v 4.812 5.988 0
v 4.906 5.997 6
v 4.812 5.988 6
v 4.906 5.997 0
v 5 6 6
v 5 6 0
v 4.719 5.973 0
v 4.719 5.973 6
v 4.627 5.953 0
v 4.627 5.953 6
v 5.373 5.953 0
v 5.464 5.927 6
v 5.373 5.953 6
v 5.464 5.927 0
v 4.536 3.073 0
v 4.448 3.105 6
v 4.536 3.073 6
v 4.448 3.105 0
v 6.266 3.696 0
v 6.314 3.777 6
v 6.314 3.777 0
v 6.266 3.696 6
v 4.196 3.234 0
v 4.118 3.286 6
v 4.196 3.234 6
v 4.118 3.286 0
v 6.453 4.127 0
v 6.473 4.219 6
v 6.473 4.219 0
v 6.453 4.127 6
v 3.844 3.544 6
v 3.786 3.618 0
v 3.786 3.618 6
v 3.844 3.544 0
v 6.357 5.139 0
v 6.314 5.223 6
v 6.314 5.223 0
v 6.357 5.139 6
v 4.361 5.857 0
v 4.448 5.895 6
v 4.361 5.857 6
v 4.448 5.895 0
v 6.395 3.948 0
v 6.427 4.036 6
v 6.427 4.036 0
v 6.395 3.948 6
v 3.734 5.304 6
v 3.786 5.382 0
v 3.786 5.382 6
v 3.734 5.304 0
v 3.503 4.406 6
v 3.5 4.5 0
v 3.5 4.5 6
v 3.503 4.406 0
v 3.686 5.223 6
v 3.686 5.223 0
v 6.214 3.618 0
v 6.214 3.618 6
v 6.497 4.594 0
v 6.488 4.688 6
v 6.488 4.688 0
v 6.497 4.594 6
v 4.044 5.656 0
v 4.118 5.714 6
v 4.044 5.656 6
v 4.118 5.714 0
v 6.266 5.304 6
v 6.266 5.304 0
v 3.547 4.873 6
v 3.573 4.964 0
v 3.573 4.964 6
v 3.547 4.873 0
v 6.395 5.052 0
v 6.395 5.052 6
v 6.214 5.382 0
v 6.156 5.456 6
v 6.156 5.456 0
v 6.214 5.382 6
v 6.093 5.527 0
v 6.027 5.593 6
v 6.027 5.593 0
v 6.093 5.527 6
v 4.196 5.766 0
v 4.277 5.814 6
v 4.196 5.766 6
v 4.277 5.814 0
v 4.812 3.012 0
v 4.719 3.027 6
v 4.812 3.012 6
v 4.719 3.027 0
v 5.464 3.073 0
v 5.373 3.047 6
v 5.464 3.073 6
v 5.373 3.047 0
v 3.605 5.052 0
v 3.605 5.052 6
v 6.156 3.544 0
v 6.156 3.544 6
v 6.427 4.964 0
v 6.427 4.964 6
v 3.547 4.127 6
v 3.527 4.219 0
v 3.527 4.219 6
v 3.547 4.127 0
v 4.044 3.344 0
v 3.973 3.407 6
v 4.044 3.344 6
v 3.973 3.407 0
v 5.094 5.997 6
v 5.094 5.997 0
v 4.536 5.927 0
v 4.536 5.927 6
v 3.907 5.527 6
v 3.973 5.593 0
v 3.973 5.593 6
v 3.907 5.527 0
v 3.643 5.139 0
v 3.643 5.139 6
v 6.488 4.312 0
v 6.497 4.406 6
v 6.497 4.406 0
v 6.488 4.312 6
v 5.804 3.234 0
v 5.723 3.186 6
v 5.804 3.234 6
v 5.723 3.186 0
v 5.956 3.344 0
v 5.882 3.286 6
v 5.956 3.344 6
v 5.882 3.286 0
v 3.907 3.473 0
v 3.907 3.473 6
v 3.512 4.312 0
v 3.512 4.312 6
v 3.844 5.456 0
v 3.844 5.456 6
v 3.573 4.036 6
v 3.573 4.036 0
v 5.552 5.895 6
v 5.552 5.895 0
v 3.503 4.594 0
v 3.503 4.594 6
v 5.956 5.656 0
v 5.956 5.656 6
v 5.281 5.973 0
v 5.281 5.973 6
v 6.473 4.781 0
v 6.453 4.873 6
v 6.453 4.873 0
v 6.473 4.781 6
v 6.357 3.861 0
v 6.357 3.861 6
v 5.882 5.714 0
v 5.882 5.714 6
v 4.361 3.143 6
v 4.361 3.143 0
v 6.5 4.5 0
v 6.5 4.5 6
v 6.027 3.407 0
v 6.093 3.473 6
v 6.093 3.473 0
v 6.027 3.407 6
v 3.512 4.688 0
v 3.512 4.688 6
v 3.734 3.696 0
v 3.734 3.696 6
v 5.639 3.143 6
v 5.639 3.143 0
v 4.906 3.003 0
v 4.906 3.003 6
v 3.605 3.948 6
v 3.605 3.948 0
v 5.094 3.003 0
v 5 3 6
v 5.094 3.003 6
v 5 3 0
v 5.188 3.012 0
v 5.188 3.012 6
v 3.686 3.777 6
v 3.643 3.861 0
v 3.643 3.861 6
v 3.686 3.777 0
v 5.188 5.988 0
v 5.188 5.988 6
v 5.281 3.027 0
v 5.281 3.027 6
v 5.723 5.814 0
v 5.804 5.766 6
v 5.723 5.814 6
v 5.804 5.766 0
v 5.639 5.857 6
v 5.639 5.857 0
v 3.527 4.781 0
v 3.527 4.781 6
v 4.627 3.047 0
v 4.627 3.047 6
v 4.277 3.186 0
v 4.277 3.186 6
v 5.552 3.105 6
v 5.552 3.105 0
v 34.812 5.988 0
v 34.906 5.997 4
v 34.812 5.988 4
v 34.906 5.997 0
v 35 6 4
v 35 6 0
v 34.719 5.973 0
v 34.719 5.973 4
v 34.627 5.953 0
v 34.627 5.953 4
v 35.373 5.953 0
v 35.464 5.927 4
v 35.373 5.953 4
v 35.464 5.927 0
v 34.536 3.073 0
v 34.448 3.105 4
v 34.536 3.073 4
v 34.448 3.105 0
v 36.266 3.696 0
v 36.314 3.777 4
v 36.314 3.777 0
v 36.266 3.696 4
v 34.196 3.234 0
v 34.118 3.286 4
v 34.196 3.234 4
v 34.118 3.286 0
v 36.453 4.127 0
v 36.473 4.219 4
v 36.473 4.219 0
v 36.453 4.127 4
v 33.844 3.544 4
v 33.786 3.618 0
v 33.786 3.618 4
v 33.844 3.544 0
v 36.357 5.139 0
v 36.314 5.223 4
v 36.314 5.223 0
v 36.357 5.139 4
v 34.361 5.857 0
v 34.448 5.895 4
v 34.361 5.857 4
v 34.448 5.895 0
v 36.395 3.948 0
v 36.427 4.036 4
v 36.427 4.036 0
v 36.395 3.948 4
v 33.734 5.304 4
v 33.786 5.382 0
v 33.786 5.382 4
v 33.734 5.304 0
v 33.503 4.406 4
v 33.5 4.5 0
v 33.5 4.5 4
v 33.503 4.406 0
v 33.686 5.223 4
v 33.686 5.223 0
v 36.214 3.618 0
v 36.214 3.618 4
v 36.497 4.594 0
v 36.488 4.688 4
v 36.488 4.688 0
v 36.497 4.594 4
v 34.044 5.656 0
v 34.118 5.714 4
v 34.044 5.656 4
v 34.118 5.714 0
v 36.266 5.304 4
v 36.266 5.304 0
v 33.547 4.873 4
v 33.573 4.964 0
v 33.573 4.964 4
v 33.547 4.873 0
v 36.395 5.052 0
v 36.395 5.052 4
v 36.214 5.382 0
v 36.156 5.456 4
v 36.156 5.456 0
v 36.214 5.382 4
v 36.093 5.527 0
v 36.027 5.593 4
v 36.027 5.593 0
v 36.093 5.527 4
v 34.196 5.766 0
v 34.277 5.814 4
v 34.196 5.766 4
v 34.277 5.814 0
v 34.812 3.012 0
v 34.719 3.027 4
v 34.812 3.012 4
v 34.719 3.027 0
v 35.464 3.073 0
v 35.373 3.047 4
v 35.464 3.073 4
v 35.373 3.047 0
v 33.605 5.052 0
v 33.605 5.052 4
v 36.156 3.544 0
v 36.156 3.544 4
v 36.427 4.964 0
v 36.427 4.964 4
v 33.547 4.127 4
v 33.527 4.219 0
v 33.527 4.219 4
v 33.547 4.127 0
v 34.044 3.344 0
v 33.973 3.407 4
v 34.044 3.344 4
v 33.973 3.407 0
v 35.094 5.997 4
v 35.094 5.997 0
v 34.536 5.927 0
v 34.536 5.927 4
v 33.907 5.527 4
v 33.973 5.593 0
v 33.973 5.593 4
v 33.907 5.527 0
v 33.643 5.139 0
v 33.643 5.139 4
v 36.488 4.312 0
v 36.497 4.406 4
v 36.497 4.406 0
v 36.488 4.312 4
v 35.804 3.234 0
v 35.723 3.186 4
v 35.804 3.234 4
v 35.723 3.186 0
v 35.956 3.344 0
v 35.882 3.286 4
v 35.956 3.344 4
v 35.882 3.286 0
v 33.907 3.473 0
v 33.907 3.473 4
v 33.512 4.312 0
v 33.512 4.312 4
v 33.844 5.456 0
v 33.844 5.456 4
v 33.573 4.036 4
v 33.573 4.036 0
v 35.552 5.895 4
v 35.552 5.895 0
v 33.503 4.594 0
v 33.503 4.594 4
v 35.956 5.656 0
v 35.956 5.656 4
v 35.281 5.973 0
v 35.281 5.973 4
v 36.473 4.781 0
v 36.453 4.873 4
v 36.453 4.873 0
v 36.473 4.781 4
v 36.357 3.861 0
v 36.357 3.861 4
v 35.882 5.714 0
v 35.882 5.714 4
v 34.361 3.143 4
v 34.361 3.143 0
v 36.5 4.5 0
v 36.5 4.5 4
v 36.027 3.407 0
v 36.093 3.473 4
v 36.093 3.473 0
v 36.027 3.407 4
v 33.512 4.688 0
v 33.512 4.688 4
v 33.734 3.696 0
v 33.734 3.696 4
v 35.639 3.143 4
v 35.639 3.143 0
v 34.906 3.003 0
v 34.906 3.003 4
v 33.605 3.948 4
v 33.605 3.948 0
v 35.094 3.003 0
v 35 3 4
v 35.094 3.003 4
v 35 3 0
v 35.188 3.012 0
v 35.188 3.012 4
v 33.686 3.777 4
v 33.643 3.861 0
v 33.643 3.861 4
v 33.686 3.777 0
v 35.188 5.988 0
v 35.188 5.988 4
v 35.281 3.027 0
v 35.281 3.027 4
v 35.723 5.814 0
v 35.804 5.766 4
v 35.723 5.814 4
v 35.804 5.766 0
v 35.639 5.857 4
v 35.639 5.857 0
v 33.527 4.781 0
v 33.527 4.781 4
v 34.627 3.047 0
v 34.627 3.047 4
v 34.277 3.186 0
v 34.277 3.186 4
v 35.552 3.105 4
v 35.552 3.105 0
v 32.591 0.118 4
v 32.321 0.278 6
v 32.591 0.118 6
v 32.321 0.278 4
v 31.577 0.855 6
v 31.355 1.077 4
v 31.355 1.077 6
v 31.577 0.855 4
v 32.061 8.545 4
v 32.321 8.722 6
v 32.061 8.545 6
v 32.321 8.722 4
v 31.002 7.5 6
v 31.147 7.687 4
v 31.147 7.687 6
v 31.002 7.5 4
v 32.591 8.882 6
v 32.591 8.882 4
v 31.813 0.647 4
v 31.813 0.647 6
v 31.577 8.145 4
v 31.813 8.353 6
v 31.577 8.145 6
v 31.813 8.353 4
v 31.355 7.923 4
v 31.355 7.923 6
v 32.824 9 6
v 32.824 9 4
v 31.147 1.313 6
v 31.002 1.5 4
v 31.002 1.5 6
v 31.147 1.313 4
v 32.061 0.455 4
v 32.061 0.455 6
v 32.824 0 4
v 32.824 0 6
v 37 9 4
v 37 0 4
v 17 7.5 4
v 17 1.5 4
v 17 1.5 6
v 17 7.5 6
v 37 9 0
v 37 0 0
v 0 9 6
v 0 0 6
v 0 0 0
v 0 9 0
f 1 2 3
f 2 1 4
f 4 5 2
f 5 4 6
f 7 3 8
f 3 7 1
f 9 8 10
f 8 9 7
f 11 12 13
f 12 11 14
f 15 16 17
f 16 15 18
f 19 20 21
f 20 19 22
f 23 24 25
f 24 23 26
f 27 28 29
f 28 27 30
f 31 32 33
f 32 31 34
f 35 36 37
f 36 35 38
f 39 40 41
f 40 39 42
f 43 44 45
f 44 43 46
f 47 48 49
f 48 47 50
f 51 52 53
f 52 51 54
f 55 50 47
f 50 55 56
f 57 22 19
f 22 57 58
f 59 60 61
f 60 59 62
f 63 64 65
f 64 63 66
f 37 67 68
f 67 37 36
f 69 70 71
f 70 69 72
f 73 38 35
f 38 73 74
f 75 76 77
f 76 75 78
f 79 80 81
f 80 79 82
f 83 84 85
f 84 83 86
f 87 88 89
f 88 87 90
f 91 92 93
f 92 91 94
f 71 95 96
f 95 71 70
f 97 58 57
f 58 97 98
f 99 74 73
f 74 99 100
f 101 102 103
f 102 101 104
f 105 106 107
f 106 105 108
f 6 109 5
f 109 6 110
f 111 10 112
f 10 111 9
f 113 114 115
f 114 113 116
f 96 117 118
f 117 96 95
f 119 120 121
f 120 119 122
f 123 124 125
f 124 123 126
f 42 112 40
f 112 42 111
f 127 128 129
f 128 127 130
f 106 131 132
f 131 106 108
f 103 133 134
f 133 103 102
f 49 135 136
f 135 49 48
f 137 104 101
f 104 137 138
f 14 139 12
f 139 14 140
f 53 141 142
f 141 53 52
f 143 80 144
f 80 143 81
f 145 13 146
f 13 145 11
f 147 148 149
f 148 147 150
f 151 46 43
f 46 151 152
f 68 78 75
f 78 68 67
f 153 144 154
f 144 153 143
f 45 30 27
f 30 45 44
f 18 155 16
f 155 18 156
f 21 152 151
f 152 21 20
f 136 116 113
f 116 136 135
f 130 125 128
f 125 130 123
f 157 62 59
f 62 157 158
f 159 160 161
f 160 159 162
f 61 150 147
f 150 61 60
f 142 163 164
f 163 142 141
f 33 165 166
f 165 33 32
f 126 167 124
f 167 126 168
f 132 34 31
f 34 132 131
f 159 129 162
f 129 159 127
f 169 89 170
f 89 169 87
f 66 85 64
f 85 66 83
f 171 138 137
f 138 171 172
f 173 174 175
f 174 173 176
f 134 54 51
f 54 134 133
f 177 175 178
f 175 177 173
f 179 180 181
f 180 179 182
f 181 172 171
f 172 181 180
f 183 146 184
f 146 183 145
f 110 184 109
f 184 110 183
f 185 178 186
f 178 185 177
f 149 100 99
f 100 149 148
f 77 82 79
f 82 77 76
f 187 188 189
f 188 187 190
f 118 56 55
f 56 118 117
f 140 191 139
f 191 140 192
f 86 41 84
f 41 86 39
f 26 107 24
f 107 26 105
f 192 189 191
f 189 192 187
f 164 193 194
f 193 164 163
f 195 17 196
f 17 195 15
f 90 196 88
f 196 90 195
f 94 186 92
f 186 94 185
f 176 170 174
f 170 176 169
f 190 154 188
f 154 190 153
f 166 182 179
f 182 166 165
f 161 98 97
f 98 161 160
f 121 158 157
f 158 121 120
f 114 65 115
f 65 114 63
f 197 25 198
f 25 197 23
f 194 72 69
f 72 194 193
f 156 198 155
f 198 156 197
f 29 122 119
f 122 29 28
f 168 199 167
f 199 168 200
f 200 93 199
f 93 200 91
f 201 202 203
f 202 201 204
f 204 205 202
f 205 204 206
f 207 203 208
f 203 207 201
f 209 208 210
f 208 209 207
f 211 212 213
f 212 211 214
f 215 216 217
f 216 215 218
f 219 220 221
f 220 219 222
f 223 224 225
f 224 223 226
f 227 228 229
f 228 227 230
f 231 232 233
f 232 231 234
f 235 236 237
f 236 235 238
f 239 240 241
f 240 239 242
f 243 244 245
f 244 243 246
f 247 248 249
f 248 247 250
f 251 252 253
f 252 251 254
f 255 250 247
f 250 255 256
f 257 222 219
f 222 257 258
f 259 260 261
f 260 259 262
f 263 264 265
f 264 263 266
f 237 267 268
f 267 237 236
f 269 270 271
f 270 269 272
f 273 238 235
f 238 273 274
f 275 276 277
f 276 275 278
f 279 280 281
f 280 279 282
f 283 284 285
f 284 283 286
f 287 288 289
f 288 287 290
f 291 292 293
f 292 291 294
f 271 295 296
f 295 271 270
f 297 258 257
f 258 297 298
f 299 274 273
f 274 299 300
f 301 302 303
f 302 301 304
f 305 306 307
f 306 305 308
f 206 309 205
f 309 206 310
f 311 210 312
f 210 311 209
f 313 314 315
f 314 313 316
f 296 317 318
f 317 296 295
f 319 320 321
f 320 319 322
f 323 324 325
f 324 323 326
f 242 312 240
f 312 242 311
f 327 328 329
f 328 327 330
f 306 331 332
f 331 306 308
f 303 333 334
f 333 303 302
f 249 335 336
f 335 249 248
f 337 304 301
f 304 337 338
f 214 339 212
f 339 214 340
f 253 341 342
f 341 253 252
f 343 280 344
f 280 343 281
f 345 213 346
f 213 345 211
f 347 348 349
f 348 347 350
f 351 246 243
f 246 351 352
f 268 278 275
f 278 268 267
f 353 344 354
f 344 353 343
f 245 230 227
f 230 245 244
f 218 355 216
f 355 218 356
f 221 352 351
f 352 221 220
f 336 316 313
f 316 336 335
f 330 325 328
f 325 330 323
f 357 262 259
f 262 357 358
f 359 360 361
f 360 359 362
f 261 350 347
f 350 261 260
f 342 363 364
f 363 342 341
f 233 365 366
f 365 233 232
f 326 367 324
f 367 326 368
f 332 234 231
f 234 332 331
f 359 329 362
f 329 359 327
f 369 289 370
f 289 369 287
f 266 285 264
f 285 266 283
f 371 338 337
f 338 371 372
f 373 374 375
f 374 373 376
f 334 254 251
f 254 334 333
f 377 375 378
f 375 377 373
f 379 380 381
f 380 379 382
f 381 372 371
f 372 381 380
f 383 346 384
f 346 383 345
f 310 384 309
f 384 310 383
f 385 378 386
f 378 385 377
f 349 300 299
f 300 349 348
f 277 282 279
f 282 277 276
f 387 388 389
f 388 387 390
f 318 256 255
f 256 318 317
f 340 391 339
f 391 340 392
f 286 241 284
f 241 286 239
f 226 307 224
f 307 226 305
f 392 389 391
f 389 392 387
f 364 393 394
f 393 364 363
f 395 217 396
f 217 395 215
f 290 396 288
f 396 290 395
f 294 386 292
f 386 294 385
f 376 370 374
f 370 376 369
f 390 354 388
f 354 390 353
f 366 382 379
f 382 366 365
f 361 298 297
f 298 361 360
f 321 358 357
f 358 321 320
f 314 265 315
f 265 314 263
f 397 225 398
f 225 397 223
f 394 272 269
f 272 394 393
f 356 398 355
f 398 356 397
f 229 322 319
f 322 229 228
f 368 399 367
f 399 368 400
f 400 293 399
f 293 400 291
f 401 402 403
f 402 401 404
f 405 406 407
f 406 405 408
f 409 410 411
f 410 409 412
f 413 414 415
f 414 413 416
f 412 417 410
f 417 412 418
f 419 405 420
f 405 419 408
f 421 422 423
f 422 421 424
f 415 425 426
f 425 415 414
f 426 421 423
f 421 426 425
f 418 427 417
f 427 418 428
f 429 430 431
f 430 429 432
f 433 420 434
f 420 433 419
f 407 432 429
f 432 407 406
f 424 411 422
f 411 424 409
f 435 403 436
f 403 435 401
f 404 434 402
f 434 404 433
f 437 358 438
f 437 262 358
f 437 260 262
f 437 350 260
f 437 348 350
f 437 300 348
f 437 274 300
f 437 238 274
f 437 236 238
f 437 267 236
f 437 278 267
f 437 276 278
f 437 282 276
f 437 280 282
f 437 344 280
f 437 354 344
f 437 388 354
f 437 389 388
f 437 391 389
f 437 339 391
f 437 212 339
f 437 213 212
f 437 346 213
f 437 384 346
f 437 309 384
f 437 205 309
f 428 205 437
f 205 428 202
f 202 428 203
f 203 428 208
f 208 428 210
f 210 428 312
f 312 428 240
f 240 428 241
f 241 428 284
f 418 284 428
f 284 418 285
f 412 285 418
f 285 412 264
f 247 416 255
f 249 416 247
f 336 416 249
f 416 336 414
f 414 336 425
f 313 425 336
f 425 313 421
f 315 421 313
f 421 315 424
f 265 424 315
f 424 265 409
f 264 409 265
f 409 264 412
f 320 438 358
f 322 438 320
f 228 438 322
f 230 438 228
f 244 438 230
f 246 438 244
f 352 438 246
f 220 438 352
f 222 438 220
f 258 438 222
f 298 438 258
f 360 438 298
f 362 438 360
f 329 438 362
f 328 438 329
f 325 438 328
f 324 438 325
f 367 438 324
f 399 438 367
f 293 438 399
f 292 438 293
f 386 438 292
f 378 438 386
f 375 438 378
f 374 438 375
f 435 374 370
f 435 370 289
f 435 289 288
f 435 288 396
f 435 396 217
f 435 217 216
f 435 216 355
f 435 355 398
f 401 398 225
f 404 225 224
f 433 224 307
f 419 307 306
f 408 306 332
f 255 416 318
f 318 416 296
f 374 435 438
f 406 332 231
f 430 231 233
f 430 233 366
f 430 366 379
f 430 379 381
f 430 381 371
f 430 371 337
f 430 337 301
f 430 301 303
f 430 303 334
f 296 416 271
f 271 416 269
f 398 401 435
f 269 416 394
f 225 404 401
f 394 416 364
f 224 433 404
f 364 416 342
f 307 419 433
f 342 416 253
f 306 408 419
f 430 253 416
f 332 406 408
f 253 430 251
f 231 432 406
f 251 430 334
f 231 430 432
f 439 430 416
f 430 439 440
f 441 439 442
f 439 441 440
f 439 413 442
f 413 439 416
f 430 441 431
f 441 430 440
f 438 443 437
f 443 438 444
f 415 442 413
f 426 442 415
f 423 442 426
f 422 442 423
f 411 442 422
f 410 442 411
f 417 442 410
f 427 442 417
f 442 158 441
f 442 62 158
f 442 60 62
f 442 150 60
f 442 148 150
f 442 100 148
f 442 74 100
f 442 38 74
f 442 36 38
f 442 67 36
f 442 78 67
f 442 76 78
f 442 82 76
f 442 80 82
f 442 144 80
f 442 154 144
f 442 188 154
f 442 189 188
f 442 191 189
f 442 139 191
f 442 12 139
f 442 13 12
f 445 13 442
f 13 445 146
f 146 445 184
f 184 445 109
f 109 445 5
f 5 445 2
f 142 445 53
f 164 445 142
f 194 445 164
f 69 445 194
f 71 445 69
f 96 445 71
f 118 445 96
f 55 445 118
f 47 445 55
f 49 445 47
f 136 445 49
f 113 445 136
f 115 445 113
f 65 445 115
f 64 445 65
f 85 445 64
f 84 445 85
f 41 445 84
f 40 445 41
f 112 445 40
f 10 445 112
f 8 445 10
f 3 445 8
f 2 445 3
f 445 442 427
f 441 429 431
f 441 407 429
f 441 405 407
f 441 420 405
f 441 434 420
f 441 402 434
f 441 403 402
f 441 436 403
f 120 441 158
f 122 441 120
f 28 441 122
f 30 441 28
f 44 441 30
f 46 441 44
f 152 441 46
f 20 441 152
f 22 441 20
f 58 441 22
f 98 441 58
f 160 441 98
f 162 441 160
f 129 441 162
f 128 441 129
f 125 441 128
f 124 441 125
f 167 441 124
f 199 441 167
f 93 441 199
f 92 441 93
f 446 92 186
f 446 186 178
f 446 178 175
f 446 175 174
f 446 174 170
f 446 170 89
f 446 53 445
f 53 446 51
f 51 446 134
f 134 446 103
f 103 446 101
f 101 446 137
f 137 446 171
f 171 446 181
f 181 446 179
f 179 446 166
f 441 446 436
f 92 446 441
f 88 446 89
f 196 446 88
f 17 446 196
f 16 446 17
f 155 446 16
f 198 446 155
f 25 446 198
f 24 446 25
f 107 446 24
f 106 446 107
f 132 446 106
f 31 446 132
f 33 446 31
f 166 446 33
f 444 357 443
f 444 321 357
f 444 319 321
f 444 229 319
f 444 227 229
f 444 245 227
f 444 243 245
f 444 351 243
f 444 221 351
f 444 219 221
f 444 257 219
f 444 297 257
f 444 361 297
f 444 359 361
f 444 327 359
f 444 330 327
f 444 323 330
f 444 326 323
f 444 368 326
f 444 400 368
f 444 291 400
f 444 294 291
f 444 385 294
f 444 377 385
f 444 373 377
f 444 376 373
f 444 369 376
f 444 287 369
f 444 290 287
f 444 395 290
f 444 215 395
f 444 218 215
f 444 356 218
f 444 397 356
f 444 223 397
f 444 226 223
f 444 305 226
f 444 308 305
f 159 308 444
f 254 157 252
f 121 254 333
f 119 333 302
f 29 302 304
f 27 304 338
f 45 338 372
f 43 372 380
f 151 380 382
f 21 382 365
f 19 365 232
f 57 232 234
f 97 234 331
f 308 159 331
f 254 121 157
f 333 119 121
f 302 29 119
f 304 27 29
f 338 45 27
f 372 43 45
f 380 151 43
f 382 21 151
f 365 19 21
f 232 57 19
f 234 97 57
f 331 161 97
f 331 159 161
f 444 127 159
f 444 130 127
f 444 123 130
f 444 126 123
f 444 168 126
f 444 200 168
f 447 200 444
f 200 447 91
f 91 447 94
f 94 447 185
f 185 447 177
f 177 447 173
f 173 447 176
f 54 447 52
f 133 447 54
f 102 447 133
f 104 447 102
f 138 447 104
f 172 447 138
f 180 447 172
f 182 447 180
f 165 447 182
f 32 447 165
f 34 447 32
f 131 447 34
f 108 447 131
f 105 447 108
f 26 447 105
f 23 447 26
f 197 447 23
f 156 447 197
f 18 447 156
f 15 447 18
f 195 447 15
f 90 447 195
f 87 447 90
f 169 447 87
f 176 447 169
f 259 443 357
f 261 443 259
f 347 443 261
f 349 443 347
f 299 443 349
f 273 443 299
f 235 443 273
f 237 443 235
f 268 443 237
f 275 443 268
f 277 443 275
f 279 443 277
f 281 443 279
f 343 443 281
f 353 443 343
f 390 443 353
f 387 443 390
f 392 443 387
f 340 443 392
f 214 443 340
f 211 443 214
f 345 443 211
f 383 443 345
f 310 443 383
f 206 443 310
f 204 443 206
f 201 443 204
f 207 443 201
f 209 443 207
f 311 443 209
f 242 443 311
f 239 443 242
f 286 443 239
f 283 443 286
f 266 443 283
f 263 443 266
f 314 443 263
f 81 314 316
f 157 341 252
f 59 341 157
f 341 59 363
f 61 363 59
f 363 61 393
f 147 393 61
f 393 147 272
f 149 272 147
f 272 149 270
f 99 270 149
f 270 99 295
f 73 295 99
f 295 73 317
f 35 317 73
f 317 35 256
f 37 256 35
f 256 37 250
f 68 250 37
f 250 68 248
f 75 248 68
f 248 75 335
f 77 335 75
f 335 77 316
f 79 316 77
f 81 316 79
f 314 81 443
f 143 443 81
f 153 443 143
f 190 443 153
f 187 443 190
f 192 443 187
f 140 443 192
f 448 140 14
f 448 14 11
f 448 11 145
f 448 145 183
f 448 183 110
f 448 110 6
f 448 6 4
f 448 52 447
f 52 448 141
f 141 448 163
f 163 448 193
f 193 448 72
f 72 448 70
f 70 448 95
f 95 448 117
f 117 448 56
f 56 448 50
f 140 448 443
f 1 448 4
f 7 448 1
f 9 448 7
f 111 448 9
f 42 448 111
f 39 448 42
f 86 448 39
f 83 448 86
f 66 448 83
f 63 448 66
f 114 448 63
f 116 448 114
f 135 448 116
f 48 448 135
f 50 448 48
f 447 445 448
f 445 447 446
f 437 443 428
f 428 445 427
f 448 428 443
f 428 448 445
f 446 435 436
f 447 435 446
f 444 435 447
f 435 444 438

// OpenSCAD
difference(){
	union(){ 

        translate([0,0,0]){
           cube([37,9,6], center=false);
        }                
	}
	union() {
        translate([5,4.5,-1]){
            rotate([0,0,90]){
                cylinder(h=8, r=1.5,$fn=100, center=false);
            }   
        }
        translate([35,4.5,-1]){
            rotate([0,0,90]){
                cylinder(h=6, r=1.5,$fn=100, center=false);
            }   
        }
        translate([35,4.5,4]){
            rotate([0,0,90]){
                cylinder(h=6, r=5,$fn=100, center=false);
            }   
        }
        translate([35-18,1.5,4]){
           cube([18,6,6], center=false);
        }                
        
	}
}
